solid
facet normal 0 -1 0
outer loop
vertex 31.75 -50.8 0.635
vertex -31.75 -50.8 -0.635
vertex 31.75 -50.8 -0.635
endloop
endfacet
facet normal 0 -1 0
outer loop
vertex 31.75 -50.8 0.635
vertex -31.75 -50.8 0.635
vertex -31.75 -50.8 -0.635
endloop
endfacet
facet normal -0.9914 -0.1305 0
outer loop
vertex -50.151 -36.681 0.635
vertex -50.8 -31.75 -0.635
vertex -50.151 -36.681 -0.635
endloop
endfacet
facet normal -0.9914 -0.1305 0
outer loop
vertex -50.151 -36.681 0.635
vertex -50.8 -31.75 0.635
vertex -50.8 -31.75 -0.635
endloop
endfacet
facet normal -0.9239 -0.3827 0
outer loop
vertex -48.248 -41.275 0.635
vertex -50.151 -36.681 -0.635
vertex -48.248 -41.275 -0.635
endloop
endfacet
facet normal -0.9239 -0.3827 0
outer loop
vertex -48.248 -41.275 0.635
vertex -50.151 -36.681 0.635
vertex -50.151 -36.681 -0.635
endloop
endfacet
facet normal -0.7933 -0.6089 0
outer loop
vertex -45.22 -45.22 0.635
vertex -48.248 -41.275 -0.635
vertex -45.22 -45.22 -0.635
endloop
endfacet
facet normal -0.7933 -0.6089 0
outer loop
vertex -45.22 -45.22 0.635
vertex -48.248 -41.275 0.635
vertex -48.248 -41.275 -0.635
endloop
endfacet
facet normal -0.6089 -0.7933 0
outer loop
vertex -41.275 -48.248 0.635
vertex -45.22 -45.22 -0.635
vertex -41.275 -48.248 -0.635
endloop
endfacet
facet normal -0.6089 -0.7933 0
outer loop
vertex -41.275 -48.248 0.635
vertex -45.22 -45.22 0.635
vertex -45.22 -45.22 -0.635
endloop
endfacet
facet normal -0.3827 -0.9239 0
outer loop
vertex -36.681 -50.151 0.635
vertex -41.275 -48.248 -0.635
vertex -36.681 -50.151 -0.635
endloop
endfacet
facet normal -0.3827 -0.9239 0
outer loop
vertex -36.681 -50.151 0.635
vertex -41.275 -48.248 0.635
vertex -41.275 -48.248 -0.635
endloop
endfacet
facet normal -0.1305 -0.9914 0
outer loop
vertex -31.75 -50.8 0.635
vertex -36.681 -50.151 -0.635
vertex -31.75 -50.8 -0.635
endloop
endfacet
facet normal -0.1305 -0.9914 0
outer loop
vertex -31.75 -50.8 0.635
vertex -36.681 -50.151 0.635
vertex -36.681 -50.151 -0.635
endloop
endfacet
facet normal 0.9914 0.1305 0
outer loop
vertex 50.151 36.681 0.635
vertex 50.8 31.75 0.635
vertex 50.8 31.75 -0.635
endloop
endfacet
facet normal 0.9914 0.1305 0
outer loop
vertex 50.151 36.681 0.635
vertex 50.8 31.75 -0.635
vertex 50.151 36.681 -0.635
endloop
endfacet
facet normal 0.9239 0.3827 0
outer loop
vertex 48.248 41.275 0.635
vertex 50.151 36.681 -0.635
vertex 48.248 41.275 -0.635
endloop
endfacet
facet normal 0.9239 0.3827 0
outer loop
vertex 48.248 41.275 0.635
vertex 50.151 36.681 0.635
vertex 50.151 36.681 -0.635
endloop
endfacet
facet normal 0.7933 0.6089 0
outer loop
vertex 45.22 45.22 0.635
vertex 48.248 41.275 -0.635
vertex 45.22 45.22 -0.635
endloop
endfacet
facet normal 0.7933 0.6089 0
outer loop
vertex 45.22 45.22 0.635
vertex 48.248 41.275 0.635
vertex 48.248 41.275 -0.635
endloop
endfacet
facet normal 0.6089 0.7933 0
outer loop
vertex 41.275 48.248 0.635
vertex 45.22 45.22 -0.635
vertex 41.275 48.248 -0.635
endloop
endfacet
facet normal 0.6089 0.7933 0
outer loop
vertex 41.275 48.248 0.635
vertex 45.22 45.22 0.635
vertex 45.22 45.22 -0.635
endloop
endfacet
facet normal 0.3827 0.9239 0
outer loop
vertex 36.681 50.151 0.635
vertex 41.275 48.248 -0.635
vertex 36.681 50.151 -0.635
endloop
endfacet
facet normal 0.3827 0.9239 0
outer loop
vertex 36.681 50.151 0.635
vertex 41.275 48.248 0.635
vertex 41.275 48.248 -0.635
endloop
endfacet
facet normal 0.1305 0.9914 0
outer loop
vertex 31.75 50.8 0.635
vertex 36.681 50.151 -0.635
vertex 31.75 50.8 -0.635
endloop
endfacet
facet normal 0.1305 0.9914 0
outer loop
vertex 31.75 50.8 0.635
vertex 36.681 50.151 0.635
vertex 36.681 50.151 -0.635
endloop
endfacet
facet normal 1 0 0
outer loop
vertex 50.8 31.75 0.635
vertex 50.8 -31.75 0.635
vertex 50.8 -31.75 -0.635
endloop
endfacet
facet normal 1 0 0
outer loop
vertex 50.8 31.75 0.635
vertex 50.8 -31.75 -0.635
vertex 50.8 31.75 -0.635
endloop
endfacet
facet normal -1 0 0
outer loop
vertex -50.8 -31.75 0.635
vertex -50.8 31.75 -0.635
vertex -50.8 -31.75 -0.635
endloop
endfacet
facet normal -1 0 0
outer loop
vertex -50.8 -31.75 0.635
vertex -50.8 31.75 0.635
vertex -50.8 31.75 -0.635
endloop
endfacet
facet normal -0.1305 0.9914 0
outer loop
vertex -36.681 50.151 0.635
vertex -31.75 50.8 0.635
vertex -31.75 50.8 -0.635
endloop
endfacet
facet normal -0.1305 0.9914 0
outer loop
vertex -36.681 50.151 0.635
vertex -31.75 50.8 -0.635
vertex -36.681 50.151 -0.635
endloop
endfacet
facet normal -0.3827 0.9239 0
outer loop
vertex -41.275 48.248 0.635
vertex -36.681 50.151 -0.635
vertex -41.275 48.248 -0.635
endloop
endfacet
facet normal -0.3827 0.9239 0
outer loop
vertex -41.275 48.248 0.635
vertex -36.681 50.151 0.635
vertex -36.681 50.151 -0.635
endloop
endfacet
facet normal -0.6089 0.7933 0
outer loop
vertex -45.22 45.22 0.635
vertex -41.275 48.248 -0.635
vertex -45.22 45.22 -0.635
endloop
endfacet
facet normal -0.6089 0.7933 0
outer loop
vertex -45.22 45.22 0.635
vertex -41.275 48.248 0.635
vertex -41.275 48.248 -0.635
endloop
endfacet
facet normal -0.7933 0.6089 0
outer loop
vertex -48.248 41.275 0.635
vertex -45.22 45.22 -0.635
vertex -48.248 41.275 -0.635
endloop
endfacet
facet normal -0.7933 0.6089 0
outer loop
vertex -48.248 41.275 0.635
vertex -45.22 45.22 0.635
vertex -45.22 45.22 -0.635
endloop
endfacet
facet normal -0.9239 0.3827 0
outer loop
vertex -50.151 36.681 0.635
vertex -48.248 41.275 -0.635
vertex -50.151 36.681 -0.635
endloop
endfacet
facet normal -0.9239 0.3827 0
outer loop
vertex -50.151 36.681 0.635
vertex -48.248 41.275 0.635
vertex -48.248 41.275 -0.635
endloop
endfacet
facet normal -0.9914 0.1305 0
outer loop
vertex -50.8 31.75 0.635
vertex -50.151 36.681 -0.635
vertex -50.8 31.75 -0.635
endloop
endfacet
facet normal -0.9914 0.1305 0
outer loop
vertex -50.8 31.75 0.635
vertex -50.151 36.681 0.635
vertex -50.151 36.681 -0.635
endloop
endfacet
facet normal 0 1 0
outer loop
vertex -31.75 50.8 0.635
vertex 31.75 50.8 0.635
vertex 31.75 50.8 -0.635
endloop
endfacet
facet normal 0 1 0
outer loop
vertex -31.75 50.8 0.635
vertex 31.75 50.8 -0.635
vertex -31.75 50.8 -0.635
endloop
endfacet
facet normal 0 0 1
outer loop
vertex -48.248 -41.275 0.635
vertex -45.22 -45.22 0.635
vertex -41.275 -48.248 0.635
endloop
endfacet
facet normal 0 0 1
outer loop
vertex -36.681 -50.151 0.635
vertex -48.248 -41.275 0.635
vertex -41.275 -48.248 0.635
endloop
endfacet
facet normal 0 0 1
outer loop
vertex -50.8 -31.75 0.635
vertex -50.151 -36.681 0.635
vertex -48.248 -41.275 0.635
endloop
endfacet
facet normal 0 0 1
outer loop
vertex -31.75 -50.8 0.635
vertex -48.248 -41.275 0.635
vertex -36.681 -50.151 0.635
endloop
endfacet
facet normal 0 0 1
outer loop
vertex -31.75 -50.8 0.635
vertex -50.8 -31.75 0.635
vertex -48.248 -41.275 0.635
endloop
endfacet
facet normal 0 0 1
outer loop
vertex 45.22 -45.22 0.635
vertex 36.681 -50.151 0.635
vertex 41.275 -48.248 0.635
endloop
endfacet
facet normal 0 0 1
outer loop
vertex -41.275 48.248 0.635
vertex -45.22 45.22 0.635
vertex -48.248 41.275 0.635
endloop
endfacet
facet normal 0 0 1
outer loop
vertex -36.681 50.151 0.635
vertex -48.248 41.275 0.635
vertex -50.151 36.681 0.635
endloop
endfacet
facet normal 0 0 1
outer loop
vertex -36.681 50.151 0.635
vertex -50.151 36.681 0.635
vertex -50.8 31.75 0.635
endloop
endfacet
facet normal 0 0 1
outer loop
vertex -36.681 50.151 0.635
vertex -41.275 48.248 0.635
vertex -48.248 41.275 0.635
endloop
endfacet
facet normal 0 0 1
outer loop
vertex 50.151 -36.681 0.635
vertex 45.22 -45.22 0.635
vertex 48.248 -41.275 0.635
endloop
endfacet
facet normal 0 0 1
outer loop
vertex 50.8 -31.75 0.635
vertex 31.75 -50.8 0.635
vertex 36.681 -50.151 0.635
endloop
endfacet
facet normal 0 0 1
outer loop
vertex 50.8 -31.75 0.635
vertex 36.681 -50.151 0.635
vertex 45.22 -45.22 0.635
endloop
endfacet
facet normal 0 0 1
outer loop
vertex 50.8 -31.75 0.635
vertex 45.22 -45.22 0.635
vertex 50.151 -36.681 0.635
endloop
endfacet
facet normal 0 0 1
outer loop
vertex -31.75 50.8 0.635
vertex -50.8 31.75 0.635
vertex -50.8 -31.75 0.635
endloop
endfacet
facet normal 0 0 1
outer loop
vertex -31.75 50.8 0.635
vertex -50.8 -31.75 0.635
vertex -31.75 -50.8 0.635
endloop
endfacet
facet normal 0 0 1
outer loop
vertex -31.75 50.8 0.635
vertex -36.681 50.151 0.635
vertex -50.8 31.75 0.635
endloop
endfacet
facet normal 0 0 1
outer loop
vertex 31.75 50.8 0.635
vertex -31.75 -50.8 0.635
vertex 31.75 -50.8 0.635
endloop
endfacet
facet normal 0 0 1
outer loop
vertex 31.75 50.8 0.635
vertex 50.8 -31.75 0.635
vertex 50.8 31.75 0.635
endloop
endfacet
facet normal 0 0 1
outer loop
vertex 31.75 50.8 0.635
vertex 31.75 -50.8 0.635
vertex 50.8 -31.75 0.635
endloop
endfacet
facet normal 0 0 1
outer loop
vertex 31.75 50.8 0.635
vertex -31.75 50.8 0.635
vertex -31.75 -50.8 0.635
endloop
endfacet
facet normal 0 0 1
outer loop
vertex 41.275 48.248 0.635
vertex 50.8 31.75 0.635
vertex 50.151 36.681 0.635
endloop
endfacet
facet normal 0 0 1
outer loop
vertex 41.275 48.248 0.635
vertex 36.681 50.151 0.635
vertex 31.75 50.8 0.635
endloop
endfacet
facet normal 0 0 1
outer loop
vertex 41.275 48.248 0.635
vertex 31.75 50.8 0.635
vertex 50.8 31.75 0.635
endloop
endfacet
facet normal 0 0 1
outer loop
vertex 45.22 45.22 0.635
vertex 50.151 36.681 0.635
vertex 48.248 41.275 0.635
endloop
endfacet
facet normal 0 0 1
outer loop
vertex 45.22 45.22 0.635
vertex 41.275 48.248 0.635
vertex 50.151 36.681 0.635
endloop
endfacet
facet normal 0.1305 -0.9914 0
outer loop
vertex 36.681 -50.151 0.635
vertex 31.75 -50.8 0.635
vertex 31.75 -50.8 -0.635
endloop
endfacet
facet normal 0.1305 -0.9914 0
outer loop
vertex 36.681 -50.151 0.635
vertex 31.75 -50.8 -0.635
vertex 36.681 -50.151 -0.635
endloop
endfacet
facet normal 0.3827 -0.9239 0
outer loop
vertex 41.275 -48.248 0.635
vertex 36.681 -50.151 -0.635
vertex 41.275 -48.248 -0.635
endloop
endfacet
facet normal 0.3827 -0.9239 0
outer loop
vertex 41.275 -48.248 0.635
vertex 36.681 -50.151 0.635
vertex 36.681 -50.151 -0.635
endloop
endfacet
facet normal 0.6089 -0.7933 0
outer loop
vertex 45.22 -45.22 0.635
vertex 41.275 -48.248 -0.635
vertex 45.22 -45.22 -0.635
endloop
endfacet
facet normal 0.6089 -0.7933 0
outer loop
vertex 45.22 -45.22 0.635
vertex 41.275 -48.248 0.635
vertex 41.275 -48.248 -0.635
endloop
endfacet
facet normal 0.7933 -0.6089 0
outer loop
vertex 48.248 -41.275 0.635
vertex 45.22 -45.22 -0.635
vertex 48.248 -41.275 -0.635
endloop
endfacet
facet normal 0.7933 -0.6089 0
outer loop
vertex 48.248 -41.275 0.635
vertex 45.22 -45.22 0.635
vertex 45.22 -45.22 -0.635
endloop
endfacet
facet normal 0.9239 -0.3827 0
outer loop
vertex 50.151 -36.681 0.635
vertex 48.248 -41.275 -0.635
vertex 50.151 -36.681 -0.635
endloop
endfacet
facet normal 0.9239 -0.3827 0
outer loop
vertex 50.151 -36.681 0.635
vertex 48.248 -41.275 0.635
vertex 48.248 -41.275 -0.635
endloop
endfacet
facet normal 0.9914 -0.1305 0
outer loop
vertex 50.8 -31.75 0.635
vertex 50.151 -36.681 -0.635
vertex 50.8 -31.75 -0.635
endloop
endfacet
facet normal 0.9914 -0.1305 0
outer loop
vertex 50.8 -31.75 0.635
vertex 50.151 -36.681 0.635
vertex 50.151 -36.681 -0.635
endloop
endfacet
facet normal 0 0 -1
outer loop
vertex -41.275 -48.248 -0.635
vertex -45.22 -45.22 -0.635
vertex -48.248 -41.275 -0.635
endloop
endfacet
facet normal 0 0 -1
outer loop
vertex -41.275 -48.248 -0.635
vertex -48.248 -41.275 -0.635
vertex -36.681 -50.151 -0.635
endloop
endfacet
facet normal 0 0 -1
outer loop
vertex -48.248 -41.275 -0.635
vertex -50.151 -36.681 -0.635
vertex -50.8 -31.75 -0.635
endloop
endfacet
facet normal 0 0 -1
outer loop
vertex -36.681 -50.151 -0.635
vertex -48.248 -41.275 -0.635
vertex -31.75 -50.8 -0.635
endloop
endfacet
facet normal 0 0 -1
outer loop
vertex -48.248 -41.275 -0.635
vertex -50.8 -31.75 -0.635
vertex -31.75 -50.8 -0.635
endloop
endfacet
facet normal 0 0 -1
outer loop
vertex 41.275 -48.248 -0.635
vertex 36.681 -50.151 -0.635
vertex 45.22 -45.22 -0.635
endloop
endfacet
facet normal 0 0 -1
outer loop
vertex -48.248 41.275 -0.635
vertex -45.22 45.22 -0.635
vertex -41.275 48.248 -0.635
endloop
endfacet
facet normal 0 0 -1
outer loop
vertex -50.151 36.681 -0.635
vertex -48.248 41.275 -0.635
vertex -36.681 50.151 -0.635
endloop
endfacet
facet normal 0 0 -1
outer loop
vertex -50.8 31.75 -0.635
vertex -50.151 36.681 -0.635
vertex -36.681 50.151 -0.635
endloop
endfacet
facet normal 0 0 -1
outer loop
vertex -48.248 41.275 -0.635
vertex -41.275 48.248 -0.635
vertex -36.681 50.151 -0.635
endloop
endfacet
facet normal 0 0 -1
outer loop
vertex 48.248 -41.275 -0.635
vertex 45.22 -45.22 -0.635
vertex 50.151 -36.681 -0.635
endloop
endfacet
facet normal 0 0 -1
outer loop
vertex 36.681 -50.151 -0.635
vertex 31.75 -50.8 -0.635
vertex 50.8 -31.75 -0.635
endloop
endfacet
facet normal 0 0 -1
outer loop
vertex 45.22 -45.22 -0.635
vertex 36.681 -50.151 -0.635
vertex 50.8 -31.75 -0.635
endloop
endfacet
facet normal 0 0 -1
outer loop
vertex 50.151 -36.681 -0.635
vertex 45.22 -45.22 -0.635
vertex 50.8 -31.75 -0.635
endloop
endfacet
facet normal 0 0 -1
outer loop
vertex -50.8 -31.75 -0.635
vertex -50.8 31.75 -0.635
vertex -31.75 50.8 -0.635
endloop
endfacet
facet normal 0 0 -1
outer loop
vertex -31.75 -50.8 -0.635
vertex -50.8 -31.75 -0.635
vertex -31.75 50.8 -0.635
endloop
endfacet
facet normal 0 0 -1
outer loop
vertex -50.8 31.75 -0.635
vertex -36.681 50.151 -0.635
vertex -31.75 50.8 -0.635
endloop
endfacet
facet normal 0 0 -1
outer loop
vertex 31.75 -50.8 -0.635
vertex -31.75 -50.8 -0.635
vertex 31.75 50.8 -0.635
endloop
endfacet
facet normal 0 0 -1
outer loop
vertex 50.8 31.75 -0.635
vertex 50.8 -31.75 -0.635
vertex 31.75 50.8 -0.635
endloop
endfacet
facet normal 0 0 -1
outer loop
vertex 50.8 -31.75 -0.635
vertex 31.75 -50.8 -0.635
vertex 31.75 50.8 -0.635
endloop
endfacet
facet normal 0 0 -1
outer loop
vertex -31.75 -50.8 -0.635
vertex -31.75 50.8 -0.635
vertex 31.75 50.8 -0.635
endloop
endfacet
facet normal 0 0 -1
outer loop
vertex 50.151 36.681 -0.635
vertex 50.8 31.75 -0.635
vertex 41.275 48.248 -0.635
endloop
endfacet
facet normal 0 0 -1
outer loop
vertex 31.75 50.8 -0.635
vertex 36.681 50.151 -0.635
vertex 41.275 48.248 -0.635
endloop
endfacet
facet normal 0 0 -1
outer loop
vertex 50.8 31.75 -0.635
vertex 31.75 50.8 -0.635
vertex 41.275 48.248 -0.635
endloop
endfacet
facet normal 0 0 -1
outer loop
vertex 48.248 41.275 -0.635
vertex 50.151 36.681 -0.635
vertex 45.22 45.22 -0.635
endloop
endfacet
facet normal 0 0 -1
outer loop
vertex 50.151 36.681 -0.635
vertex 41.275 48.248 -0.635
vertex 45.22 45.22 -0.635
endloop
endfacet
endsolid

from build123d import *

# Parameters (mm, degrees)
F1_DEPTH = 0.635


with BuildPart() as f1:
    # F0 (on Top) → F1 (new body, symmetric)
    with BuildSketch(Plane.XY):
        with BuildLine():
            Line((-31.75, -50.8), (31.75, -50.8))
            ThreePointArc((31.75, -50.8), (45.220384, -45.220384), (50.8, -31.75))
            Line((50.8, -31.75), (50.8, 31.75))
            ThreePointArc((50.8, 31.75), (45.220384, 45.220384), (31.75, 50.8))
            Line((31.75, 50.8), (-31.75, 50.8))
            ThreePointArc((-31.75, 50.8), (-45.220384, 45.220384), (-50.8, 31.75))
            Line((-50.8, 31.75), (-50.8, -31.75))
            ThreePointArc((-50.8, -31.75), (-45.220384, -45.220384), (-31.75, -50.8))
        make_face()
    extrude(amount=F1_DEPTH, both=True)


solid = f1.part
